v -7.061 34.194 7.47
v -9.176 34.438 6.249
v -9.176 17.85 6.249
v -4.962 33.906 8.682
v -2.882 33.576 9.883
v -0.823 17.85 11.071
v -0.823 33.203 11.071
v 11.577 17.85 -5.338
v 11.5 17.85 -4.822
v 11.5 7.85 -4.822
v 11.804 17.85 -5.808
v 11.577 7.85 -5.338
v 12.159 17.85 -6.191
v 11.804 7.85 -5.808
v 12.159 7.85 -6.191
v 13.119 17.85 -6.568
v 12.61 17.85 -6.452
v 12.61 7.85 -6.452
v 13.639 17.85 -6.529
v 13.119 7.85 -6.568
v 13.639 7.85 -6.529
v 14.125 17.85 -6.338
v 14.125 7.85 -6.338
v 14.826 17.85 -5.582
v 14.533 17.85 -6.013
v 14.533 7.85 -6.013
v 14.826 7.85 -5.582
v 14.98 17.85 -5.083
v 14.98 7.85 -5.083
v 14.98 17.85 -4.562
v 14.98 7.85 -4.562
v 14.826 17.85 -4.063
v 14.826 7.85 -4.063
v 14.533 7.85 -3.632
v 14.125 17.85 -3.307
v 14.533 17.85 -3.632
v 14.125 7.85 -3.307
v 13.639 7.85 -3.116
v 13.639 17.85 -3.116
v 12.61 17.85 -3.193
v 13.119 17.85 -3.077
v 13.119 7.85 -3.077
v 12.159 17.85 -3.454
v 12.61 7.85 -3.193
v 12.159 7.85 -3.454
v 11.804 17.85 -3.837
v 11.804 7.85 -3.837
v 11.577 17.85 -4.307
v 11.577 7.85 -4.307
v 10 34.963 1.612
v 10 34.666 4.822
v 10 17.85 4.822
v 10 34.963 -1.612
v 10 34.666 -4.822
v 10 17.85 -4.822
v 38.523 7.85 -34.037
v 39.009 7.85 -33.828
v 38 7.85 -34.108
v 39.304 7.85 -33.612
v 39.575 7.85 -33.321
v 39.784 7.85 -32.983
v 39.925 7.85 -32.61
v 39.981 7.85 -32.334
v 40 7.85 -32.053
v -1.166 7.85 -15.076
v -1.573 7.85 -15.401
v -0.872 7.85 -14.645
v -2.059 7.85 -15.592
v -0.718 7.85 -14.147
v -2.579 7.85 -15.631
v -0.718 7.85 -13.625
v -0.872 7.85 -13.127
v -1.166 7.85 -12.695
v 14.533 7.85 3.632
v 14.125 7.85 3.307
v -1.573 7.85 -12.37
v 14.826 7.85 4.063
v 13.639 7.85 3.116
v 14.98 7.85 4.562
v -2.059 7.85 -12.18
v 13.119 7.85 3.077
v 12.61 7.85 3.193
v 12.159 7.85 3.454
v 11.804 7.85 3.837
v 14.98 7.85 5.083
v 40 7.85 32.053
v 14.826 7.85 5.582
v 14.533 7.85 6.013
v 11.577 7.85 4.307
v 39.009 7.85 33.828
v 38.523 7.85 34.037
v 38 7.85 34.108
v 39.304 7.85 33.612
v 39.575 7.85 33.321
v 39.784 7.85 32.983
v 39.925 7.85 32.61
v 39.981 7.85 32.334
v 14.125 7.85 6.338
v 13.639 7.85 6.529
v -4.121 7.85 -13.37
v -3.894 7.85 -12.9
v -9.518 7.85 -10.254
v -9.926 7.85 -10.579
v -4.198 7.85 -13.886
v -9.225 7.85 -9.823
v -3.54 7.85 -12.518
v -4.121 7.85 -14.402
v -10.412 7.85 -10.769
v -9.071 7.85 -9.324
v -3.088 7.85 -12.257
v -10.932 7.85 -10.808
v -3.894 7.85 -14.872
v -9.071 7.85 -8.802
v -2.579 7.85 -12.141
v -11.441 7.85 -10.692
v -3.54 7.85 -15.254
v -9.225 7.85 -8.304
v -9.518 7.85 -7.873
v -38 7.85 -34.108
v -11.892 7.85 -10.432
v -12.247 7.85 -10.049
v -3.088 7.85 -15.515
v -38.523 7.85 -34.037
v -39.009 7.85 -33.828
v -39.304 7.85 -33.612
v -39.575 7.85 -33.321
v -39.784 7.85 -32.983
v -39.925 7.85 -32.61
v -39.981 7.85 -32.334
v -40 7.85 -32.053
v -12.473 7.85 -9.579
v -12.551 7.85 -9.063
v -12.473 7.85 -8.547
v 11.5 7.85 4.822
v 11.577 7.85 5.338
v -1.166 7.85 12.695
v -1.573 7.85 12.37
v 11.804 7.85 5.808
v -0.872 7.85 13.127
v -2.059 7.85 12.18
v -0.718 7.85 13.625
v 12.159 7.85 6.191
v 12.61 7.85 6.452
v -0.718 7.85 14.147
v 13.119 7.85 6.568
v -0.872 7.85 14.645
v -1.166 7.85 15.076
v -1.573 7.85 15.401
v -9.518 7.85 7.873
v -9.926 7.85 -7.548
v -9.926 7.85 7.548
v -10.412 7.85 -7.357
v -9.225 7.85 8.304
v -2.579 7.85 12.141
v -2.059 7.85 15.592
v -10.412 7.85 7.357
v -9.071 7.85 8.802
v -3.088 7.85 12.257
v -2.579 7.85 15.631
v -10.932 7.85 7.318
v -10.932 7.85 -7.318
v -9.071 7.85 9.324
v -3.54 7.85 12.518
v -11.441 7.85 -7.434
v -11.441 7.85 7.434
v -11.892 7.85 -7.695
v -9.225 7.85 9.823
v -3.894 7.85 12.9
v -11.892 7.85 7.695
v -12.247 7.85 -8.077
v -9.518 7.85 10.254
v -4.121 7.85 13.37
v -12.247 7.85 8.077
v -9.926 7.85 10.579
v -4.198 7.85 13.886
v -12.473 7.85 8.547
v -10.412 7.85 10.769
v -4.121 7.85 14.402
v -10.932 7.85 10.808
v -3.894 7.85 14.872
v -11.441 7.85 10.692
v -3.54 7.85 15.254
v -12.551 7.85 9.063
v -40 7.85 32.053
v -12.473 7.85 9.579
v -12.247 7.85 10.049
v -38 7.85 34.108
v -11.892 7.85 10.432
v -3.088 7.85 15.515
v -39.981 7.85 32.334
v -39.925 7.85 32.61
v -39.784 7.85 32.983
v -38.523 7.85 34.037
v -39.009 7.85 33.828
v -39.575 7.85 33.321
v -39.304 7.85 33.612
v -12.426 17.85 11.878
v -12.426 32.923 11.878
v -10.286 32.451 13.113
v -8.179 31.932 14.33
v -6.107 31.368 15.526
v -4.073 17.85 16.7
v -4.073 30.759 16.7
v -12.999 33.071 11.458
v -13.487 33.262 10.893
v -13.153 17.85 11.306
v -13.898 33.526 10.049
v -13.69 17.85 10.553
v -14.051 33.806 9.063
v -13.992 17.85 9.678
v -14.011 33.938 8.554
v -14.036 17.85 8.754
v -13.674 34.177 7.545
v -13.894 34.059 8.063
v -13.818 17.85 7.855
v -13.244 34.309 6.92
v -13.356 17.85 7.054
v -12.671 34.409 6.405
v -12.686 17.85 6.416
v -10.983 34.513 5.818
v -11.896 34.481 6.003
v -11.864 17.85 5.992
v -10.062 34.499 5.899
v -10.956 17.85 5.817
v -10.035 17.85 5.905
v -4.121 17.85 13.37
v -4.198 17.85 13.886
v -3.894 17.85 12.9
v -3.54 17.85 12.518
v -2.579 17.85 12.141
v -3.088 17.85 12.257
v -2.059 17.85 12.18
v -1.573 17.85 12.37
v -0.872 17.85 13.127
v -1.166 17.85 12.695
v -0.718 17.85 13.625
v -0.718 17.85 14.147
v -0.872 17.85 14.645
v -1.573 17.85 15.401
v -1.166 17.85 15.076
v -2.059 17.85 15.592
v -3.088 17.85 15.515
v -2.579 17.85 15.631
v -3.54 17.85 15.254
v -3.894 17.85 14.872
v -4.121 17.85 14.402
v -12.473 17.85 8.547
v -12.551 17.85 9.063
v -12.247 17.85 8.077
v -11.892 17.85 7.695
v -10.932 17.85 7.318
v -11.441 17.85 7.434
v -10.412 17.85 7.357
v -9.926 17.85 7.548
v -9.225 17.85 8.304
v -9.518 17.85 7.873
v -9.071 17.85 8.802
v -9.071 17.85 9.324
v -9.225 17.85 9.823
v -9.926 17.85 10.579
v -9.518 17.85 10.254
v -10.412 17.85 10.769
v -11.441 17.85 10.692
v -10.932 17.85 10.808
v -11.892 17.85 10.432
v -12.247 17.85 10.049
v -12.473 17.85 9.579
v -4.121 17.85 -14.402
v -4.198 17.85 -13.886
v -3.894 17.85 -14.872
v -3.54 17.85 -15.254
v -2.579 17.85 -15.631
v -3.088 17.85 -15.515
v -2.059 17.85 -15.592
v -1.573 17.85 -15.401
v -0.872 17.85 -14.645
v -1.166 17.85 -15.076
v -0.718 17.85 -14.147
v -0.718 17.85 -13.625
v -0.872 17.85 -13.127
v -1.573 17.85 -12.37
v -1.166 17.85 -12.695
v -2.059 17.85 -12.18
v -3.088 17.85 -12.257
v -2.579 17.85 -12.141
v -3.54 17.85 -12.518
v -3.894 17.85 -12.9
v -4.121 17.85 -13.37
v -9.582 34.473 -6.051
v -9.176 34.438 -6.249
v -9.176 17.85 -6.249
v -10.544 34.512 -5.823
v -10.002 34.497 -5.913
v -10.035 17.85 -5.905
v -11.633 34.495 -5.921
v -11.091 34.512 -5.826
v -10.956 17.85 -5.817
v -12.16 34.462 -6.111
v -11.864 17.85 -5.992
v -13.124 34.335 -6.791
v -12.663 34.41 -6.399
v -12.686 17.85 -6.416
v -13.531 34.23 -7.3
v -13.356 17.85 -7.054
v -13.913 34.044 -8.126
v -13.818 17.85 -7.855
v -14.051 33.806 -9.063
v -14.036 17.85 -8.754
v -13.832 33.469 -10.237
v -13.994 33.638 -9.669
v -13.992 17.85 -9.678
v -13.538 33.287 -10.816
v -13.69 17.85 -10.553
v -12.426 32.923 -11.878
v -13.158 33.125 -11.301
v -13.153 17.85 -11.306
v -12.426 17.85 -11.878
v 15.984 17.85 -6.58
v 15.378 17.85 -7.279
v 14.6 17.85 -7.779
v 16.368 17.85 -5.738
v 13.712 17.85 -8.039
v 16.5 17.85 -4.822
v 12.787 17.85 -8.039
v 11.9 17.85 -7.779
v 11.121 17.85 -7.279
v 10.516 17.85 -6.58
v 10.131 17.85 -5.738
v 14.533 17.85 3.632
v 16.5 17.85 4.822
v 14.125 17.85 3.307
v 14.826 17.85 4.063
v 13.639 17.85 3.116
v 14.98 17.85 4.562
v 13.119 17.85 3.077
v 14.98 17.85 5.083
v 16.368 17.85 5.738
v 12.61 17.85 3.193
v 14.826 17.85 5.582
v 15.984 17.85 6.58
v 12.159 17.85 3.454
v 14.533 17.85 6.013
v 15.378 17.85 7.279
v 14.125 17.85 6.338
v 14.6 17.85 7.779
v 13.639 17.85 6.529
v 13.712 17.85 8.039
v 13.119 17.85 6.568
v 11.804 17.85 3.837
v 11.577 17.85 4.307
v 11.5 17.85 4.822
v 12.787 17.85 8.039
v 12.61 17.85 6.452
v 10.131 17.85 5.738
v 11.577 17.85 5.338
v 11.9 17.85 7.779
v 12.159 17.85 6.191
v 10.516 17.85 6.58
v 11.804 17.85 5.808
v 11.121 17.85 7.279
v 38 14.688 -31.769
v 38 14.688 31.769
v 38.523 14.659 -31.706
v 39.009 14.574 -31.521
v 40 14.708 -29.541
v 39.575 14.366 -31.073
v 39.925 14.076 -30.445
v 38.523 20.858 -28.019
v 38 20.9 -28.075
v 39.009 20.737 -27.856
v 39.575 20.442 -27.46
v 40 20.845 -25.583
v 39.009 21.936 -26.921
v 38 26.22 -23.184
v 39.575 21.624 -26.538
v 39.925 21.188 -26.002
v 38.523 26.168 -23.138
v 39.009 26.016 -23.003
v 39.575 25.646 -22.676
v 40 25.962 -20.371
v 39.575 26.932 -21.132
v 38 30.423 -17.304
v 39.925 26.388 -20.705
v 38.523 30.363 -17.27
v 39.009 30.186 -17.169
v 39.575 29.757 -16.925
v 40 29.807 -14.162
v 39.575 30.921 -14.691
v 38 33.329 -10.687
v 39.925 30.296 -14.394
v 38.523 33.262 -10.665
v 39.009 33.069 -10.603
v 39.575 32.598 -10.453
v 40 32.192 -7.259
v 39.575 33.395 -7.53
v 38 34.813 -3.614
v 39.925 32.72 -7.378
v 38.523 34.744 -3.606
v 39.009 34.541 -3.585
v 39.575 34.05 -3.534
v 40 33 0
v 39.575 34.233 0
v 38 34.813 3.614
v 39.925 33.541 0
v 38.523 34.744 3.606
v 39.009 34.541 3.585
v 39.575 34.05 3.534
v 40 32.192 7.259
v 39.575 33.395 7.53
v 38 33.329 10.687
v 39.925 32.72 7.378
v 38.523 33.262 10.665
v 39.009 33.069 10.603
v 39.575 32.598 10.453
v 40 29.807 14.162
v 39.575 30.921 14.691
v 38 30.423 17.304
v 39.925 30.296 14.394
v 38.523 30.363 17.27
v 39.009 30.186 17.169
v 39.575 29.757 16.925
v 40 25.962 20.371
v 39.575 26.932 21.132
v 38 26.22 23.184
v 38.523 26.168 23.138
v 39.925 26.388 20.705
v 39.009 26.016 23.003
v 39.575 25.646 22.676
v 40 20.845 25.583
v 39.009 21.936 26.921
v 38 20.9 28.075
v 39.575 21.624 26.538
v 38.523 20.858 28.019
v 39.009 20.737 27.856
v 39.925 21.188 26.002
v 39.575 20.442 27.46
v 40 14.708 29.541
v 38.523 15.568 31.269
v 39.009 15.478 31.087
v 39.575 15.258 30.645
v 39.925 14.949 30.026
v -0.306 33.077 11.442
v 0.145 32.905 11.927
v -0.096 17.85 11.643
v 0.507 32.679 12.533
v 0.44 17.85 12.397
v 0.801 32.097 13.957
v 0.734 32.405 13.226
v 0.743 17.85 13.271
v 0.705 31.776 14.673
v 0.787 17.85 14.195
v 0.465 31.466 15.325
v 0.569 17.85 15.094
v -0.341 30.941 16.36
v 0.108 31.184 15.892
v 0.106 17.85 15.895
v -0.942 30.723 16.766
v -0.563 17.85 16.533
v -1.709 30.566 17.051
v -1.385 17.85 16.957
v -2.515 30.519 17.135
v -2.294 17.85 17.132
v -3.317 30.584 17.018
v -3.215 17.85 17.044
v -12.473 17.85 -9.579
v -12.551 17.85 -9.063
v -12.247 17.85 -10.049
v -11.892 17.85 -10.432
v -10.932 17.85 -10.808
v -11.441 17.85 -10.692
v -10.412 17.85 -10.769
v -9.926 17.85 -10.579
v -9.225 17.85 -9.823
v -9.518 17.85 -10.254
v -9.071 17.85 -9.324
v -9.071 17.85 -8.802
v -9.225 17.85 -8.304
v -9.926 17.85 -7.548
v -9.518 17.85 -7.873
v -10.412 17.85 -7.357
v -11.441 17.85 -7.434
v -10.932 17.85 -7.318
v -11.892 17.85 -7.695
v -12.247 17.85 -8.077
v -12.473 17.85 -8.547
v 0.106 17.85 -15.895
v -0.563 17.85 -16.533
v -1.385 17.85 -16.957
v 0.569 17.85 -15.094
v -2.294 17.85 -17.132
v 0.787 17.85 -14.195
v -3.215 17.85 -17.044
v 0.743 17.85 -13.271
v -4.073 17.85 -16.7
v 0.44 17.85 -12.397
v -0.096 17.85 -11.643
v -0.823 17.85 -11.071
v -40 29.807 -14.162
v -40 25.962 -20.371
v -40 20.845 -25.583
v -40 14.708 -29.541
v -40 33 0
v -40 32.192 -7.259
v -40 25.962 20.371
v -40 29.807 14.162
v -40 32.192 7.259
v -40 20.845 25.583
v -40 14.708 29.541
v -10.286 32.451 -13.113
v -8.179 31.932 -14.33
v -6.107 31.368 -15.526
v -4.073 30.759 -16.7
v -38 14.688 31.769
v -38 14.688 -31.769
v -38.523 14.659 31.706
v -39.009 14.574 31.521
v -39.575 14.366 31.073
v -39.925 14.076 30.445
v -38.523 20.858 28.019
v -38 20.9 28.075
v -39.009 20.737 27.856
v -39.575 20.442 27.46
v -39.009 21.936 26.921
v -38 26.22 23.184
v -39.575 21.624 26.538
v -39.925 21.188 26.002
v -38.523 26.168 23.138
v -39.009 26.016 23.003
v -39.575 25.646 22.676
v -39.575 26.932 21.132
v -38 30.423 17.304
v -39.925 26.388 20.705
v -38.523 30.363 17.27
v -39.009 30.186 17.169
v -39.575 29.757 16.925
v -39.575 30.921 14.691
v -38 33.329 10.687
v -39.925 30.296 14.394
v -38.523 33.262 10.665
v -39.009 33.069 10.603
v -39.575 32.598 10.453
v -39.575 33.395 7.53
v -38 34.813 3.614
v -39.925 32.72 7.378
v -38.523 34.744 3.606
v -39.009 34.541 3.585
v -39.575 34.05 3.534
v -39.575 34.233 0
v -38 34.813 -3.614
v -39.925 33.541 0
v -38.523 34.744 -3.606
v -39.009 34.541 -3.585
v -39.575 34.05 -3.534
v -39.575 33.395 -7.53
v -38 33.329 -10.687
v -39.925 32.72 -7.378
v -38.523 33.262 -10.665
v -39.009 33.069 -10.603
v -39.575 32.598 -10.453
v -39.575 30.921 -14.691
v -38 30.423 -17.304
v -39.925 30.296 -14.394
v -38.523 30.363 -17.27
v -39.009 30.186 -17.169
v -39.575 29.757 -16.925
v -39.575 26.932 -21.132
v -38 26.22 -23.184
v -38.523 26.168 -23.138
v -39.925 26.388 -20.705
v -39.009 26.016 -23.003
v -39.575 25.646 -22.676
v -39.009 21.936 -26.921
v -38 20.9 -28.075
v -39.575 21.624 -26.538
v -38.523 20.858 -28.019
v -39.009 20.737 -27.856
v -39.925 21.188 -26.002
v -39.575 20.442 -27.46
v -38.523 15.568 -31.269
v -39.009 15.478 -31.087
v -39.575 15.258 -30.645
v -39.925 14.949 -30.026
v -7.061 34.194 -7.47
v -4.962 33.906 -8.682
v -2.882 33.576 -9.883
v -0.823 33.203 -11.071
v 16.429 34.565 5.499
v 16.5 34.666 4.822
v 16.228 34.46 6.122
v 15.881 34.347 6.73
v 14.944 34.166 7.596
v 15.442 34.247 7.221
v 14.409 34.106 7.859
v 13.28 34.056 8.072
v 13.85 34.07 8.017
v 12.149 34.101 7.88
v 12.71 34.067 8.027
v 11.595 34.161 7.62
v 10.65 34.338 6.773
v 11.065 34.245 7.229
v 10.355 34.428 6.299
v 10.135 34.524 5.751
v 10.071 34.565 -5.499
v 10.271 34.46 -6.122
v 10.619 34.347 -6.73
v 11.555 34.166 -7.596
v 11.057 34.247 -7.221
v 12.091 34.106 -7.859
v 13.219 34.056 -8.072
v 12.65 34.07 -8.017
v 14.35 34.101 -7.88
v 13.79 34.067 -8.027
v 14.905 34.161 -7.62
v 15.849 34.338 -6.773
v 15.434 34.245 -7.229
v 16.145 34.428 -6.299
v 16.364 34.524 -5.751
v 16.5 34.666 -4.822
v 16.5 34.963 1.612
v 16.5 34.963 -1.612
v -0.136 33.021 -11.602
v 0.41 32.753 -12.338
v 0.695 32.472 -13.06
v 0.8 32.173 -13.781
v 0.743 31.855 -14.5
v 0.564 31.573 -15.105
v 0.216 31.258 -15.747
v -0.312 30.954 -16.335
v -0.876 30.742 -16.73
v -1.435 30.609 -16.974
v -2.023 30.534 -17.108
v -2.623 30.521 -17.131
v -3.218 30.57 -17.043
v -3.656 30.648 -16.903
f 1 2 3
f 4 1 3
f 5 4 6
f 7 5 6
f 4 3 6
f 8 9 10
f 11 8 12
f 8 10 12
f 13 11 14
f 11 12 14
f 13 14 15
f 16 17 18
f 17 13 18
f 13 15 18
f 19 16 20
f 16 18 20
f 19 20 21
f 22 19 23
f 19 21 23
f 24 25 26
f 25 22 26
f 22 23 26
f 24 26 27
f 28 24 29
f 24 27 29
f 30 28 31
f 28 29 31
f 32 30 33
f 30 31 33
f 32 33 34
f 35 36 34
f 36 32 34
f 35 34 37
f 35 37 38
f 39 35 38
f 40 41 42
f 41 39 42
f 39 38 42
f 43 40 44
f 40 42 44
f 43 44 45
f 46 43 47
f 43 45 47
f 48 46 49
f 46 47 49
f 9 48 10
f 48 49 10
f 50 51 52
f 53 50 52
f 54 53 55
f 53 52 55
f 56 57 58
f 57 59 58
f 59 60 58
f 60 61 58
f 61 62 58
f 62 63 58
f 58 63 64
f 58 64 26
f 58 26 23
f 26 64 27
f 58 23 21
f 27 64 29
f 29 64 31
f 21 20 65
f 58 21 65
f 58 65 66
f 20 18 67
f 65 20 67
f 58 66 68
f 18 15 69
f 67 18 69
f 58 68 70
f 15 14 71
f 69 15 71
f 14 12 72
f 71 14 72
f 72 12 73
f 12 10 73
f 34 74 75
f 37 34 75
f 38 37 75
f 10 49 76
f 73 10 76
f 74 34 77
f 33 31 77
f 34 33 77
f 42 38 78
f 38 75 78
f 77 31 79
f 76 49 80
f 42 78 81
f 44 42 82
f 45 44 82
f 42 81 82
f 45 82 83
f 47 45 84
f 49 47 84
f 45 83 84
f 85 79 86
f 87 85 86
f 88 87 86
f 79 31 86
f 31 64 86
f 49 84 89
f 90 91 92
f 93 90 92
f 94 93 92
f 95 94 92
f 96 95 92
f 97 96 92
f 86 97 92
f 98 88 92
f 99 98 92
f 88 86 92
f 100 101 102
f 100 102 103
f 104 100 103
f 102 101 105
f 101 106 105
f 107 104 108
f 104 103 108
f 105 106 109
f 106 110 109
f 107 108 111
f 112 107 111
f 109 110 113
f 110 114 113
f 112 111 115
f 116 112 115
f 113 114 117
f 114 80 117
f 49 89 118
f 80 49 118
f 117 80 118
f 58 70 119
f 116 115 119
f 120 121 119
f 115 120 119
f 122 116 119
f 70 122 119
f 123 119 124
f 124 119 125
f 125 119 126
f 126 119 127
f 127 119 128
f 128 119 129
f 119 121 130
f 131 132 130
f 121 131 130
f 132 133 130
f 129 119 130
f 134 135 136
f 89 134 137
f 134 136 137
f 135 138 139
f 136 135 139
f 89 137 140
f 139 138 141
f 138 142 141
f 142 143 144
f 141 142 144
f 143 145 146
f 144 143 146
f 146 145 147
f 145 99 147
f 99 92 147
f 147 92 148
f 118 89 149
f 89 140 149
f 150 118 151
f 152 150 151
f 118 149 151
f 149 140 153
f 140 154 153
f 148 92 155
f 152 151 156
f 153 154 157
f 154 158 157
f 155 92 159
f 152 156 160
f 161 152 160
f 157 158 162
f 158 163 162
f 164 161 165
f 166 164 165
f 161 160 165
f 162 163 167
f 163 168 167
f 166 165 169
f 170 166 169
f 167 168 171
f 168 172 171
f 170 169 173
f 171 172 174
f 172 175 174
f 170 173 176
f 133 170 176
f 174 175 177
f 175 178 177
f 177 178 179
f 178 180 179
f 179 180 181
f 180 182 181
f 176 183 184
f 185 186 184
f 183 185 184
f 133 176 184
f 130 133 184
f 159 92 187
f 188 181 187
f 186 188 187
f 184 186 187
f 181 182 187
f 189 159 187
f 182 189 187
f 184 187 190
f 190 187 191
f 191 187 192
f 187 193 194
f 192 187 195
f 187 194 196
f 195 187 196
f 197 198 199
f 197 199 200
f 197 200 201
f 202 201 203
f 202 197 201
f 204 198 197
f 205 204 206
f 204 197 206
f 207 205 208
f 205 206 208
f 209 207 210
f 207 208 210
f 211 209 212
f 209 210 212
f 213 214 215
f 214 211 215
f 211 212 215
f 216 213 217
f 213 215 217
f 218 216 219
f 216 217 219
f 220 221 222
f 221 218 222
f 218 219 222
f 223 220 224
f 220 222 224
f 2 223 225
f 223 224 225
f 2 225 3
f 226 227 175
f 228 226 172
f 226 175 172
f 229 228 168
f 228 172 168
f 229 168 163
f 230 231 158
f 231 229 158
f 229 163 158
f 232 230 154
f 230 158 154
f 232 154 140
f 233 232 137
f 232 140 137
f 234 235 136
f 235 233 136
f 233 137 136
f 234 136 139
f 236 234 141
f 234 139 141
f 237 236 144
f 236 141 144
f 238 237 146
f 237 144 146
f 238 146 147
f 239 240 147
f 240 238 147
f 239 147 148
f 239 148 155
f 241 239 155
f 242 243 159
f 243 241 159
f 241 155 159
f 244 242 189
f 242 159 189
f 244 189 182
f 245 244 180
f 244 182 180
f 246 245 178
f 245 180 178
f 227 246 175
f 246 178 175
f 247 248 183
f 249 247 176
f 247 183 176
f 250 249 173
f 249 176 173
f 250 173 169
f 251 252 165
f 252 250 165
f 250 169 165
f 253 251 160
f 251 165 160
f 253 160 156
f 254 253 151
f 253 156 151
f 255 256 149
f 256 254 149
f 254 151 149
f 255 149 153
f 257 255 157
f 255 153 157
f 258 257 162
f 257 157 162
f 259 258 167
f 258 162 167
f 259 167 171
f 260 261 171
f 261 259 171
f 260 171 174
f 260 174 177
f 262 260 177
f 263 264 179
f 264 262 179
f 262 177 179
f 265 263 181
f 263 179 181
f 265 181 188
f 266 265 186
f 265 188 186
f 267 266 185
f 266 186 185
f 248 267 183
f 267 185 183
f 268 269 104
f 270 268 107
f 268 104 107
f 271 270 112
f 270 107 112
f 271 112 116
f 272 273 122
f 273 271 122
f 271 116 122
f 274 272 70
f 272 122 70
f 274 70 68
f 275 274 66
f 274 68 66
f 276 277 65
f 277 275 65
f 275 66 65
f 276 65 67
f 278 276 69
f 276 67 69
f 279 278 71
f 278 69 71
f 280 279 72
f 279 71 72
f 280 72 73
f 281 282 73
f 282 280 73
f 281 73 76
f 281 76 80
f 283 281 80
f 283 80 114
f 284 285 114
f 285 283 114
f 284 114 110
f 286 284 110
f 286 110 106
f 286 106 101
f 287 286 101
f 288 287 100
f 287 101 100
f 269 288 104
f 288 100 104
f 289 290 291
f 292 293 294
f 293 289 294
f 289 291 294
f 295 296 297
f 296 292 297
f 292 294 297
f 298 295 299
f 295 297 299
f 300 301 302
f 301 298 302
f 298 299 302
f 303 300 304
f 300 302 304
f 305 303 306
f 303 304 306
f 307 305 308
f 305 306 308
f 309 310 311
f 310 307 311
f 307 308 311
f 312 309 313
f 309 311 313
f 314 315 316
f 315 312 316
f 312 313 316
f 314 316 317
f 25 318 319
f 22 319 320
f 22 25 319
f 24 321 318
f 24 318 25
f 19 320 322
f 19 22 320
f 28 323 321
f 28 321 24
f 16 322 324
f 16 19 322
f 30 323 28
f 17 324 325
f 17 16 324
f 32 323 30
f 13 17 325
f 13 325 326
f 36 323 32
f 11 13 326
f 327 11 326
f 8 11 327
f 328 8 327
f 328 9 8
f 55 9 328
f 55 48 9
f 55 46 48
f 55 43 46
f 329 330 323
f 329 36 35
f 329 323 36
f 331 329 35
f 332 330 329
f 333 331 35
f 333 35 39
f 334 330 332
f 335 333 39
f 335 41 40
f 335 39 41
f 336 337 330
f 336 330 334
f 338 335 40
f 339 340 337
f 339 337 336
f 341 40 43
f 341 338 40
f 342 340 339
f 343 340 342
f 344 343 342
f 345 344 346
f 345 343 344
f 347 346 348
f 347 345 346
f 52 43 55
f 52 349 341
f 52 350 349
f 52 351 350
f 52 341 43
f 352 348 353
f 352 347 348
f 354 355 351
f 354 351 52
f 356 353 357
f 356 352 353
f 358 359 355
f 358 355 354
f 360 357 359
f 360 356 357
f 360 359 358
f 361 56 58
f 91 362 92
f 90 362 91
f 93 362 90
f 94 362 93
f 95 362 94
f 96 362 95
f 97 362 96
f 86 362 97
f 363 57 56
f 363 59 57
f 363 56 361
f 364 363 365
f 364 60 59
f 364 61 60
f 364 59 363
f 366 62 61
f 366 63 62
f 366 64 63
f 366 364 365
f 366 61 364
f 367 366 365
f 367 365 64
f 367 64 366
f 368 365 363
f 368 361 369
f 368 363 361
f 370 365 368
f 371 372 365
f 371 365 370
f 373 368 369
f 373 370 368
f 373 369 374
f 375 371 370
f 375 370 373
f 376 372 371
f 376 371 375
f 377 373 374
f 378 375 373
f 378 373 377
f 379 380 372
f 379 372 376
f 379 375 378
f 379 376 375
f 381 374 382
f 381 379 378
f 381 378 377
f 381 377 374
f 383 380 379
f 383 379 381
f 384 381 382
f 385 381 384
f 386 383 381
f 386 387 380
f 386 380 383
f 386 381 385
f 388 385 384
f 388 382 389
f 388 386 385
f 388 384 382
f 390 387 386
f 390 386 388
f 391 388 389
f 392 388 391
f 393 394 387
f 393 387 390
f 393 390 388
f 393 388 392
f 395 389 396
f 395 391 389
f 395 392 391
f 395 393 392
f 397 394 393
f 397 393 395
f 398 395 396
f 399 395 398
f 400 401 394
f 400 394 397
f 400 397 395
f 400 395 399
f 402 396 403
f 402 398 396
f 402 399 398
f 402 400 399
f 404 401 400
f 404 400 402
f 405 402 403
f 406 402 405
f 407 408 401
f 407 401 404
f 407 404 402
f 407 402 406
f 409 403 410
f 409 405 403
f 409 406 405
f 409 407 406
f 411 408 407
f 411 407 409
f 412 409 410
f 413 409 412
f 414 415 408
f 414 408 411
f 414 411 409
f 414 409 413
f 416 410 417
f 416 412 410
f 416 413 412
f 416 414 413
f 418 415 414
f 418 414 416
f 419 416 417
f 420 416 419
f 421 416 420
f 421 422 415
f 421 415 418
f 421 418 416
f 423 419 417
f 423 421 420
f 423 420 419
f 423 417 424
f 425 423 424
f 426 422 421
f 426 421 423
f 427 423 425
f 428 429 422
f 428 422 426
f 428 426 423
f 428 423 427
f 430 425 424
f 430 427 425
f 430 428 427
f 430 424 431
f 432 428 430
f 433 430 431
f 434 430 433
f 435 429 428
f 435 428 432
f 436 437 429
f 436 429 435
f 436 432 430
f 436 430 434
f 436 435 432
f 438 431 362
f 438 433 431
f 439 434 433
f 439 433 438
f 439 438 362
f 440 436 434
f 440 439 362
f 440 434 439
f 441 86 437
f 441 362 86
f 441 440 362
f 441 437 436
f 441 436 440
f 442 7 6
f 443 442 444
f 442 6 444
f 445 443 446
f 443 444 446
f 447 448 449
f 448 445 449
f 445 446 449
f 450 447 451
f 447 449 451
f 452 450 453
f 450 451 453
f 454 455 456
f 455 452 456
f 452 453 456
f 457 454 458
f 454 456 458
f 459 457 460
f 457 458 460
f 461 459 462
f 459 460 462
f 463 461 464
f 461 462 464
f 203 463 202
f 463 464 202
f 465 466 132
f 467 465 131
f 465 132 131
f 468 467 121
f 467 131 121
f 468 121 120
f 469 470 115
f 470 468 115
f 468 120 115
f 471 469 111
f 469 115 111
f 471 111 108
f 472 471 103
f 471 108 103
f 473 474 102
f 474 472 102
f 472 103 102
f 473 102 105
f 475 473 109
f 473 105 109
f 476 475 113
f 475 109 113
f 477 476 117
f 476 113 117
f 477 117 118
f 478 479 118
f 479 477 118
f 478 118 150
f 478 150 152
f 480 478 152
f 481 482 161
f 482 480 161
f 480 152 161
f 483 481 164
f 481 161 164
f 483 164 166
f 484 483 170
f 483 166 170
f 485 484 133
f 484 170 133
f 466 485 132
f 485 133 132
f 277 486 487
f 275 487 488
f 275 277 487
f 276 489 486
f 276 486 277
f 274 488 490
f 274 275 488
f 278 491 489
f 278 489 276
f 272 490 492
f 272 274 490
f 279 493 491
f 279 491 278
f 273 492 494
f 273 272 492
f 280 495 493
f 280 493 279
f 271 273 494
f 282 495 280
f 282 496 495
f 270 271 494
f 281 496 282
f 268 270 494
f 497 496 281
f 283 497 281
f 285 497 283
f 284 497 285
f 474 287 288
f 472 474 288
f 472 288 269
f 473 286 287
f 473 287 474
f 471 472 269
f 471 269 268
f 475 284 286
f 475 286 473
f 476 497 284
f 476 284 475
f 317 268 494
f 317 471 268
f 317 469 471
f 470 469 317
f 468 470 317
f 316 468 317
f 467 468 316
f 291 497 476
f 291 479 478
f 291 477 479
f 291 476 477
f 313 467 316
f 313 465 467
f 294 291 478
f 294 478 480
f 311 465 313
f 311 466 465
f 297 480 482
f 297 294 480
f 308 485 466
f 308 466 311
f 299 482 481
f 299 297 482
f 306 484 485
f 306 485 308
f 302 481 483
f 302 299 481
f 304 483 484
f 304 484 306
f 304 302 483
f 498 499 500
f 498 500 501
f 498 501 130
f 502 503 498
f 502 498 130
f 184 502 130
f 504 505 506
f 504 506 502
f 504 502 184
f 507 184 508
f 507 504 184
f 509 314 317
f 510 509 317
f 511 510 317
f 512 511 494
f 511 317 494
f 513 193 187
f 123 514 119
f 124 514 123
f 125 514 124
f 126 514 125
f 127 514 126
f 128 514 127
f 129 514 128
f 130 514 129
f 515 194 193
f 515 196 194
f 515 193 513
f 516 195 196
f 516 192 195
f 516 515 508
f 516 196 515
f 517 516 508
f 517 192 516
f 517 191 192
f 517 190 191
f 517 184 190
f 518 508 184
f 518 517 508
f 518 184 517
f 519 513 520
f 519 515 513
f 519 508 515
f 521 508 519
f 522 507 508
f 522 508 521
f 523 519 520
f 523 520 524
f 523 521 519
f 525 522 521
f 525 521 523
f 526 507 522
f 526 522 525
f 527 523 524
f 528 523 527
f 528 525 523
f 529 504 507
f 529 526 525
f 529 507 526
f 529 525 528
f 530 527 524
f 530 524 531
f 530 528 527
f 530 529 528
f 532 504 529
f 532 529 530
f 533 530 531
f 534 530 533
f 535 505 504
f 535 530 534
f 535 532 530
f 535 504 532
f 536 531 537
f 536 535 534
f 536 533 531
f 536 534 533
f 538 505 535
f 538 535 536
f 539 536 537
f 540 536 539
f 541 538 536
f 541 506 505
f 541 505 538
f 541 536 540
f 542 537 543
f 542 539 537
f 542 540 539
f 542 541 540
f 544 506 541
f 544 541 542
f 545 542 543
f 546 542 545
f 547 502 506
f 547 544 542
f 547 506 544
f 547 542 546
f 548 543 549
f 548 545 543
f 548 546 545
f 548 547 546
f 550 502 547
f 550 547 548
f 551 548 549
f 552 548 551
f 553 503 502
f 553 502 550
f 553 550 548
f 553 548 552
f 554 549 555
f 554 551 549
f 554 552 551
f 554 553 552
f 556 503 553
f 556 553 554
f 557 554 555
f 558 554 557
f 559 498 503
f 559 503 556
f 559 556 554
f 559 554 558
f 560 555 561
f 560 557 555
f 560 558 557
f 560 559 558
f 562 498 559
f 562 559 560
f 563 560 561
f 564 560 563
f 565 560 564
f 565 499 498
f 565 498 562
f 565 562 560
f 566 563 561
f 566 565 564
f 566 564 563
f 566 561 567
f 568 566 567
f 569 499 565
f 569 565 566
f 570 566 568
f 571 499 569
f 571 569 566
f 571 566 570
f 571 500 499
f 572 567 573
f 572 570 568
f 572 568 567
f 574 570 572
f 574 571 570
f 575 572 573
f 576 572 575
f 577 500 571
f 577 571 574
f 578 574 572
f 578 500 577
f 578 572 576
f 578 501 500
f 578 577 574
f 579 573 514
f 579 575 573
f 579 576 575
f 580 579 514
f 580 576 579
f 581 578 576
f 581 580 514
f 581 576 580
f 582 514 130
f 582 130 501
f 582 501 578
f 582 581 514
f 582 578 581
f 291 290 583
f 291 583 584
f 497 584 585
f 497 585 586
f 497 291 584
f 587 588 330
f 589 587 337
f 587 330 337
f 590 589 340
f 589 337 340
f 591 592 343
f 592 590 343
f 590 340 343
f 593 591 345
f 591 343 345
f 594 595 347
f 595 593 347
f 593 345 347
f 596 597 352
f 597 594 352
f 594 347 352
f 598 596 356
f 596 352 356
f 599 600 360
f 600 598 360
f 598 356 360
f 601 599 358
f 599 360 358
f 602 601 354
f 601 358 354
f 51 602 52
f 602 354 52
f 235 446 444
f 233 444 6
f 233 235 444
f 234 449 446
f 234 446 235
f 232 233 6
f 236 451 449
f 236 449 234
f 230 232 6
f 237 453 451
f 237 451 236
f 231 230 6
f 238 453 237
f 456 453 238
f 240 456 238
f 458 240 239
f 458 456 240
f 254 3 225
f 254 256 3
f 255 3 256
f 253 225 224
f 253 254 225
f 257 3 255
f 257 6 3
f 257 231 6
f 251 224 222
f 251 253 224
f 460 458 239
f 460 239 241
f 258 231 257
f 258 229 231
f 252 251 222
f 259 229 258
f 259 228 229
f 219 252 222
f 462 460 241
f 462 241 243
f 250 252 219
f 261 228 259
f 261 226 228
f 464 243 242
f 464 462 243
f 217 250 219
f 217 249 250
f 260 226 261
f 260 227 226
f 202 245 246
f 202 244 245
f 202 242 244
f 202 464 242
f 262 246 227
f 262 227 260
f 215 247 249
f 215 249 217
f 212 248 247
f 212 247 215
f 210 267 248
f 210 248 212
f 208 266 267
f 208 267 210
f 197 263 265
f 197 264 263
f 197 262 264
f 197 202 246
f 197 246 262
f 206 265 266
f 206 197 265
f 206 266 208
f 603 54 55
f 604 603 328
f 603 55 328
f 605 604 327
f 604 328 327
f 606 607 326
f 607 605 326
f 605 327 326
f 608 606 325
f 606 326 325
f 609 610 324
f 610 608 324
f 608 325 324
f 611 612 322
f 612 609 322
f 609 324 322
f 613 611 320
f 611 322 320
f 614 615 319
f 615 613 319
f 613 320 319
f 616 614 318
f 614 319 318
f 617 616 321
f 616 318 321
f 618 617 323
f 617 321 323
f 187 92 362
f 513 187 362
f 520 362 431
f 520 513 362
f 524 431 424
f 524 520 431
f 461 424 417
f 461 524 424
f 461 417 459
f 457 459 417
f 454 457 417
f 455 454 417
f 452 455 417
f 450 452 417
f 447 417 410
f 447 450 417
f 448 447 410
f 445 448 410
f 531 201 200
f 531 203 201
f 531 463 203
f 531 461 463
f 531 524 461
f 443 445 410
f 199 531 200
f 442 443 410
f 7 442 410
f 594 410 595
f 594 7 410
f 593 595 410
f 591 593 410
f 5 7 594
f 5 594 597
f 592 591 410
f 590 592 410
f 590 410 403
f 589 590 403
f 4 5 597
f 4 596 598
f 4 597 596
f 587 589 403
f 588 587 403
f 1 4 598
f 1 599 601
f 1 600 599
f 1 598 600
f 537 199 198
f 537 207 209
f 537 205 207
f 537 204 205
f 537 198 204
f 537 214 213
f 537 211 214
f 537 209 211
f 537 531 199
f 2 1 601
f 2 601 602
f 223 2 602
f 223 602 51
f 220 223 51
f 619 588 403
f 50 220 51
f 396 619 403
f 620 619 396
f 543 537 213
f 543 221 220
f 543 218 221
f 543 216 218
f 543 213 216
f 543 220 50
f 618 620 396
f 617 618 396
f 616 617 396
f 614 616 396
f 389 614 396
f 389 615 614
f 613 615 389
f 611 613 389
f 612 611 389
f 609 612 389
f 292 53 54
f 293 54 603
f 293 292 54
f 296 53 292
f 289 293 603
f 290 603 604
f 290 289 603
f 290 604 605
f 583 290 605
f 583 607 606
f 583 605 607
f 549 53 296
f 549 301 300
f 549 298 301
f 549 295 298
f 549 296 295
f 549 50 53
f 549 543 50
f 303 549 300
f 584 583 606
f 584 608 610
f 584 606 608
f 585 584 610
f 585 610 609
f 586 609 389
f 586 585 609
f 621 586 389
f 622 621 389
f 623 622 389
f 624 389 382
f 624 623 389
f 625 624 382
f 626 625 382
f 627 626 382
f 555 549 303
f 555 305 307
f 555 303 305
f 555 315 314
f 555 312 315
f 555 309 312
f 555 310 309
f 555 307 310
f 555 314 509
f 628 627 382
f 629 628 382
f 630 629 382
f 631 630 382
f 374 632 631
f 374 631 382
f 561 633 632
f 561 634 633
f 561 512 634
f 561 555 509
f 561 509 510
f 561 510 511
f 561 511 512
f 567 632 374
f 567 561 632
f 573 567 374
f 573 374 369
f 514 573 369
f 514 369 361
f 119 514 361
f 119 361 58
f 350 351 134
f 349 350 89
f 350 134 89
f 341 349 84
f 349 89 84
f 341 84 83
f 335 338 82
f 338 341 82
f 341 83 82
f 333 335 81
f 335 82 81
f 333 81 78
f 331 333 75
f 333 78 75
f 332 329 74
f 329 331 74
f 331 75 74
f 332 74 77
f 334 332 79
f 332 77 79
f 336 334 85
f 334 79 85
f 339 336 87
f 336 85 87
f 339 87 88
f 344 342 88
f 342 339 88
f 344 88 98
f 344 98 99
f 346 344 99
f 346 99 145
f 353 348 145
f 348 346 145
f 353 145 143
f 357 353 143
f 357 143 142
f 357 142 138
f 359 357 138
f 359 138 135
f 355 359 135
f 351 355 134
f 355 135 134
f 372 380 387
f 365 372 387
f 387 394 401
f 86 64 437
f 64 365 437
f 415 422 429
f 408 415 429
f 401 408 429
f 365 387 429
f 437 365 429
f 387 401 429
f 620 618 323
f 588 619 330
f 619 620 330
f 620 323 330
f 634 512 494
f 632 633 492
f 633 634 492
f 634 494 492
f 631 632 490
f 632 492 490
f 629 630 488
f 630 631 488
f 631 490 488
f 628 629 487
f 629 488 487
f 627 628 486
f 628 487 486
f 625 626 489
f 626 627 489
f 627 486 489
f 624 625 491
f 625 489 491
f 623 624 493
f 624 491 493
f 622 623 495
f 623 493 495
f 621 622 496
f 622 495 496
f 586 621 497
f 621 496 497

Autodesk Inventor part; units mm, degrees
ref_plane "YZ Plane" through (0, 0, 0) normal (1, 0, 0) x (0, 1, 0)
ref_plane "XZ Plane" through (0, 0, 0) normal (0, 1, 0) x (-1, 0, 0)
ref_plane "XY Plane" through (0, 0, 0) normal (0, 0, 1) x (1, 0, 0)
sketch "Szkic1" plane through (0, 0, 0) normal (0, 1, 0) x (-1, 0, 0)
  circle A0 centre (0, 0) radius 14.1 construction
  line L0 (0, 0) -> (-14.1, 0) construction
  circle A1 centre (0, 0) radius 22.5 construction
  circle A2 centre (-13.2497, 4.8225) radius 1.75
  circle A3 centre (-13.2497, -4.8225) radius 1.75
  circle A4 centre (2.4484, 13.8858) radius 1.75
  circle A5 centre (10.8012, 9.0633) radius 1.75
  circle A6 centre (10.8012, -9.0633) radius 1.75
  circle A7 centre (2.4484, -13.8858) radius 1.75
  circle A8 centre (0, 0) radius 35
  circle A9 centre (-13.2497, 4.8225) radius 3.25
  circle A10 centre (-13.2497, -4.8225) radius 3.25
  circle A11 centre (2.4484, -13.8858) radius 3.25
  circle A12 centre (10.8012, -9.0633) radius 3.25
  circle A13 centre (10.8012, 9.0633) radius 3.25
  circle A14 centre (2.4484, 13.8858) radius 3.25
  line L1 (12.4262, 11.8779) -> (4.0734, 16.7004)
  line L2 (9.1762, 6.2487) -> (0.8234, 11.0712)
  line L3 (-9.9997, 4.8225) -> (-9.9997, -4.8225)
  line L4 (12.4262, -11.8779) -> (4.0734, -16.7004)
  line L5 (9.1762, -6.2487) -> (0.8234, -11.0712)
  line L6 (-16.4997, -4.8225) -> (-16.4997, 4.8225)
  line L7 (-40, 35) -> (40, 35)
  line L8 (40, 35) -> (40, -35)
  line L9 (40, -35) -> (-40, -35)
  line L10 (-40, -35) -> (-40, 35)
  line L11 (-40, 35) -> (40, -35) construction
  line L12 (40, 35) -> (-40, -35) construction
  line L13 (0, -35) -> (0, 35)
  line L14 (40, 0) -> (-40, 0)
  line L15 (56, 0) -> (-56, 0) projected
  point P0 (0, -35)
  point P1 (0, 35)
  point P2 (35, 0)
  point P3 (-35, 0)
  dimension "d0" = 28.2
  dimension "d1" = 3.5
  dimension "d2" = 40
  dimension "d5" = 360
  dimension "d7" = 45
  dimension "d8" = 70
  dimension "d12" = 6.5
  dimension "d15" = 360
  dimension "d27" = 80
  dimension "d28" = 70
revolve "Obrót2" add sketch "Szkic1" angle 180 about axis through (-10, 0, 0) along (-1, 0, 0) contours A2 | A4 | A5 | L14 L13 A14 L2 A13 L1 A8 | A8 L7 L8 L14 | L13 A14 L14 L3 A9 L6 A8 | A8 L14 L10 L7 | L13 A14 | A14 L13 | L14 L6 A9 L3 | L1 A13 L2 A14 | A9 | A13
extrude "Wyciągnięcie proste1" cut sketch "Szkic1" along normal through all contours A2 | A3 | A4 | A5 | A6 | A7 | L13 A14 | A14 L13 | L13 A11 | A11 L13 | L14 L6 A9 L3 | L3 A10 L6 L14 | L1 A13 L2 A14 | A11 L5 A12 L4 | A9 | A10 | A13 | A12
extrude "Wyciągnięcie proste2" add sketch "Szkic1" along normal blind 17.85 contours L13 A14 | A14 L13 | L13 A11 | A11 L13 | L14 L6 A9 L3 | L3 A10 L6 L14 | L1 A13 L2 A14 | A11 L5 A12 L4 | A9 | A10 | A13 | A12
extrude "Wyciągnięcie proste3" cut sketch "Szkic1" along normal blind 7.85 contours A2 | A3 | A4 | A5 | A6 | A7 | L14 L13 A14 L2 A13 L1 A8 | L14 L8 L9 A8 | A8 L7 L8 L14 | A8 L13 A11 L4 A12 L5 L14 | L13 A14 L14 L3 A9 L6 A8 | A8 L14 L10 L7 | L9 L10 L14 A8 | A8 L14 L6 A10 L3 L13 A11 | L13 A14 | A14 L13 | L13 A11 | A11 L13 | L14 L6 A9 L3 | L3 A10 L6 L14 | L1 A13 L2 A14 | A11 L5 A12 L4 | A9 | A10 | A13 | A12
fillet "Zaokrąglenie1" radius 2 2 edges at (-40, 35, 0) (40, 35, 0)
properties part number "semicylinder_2"
